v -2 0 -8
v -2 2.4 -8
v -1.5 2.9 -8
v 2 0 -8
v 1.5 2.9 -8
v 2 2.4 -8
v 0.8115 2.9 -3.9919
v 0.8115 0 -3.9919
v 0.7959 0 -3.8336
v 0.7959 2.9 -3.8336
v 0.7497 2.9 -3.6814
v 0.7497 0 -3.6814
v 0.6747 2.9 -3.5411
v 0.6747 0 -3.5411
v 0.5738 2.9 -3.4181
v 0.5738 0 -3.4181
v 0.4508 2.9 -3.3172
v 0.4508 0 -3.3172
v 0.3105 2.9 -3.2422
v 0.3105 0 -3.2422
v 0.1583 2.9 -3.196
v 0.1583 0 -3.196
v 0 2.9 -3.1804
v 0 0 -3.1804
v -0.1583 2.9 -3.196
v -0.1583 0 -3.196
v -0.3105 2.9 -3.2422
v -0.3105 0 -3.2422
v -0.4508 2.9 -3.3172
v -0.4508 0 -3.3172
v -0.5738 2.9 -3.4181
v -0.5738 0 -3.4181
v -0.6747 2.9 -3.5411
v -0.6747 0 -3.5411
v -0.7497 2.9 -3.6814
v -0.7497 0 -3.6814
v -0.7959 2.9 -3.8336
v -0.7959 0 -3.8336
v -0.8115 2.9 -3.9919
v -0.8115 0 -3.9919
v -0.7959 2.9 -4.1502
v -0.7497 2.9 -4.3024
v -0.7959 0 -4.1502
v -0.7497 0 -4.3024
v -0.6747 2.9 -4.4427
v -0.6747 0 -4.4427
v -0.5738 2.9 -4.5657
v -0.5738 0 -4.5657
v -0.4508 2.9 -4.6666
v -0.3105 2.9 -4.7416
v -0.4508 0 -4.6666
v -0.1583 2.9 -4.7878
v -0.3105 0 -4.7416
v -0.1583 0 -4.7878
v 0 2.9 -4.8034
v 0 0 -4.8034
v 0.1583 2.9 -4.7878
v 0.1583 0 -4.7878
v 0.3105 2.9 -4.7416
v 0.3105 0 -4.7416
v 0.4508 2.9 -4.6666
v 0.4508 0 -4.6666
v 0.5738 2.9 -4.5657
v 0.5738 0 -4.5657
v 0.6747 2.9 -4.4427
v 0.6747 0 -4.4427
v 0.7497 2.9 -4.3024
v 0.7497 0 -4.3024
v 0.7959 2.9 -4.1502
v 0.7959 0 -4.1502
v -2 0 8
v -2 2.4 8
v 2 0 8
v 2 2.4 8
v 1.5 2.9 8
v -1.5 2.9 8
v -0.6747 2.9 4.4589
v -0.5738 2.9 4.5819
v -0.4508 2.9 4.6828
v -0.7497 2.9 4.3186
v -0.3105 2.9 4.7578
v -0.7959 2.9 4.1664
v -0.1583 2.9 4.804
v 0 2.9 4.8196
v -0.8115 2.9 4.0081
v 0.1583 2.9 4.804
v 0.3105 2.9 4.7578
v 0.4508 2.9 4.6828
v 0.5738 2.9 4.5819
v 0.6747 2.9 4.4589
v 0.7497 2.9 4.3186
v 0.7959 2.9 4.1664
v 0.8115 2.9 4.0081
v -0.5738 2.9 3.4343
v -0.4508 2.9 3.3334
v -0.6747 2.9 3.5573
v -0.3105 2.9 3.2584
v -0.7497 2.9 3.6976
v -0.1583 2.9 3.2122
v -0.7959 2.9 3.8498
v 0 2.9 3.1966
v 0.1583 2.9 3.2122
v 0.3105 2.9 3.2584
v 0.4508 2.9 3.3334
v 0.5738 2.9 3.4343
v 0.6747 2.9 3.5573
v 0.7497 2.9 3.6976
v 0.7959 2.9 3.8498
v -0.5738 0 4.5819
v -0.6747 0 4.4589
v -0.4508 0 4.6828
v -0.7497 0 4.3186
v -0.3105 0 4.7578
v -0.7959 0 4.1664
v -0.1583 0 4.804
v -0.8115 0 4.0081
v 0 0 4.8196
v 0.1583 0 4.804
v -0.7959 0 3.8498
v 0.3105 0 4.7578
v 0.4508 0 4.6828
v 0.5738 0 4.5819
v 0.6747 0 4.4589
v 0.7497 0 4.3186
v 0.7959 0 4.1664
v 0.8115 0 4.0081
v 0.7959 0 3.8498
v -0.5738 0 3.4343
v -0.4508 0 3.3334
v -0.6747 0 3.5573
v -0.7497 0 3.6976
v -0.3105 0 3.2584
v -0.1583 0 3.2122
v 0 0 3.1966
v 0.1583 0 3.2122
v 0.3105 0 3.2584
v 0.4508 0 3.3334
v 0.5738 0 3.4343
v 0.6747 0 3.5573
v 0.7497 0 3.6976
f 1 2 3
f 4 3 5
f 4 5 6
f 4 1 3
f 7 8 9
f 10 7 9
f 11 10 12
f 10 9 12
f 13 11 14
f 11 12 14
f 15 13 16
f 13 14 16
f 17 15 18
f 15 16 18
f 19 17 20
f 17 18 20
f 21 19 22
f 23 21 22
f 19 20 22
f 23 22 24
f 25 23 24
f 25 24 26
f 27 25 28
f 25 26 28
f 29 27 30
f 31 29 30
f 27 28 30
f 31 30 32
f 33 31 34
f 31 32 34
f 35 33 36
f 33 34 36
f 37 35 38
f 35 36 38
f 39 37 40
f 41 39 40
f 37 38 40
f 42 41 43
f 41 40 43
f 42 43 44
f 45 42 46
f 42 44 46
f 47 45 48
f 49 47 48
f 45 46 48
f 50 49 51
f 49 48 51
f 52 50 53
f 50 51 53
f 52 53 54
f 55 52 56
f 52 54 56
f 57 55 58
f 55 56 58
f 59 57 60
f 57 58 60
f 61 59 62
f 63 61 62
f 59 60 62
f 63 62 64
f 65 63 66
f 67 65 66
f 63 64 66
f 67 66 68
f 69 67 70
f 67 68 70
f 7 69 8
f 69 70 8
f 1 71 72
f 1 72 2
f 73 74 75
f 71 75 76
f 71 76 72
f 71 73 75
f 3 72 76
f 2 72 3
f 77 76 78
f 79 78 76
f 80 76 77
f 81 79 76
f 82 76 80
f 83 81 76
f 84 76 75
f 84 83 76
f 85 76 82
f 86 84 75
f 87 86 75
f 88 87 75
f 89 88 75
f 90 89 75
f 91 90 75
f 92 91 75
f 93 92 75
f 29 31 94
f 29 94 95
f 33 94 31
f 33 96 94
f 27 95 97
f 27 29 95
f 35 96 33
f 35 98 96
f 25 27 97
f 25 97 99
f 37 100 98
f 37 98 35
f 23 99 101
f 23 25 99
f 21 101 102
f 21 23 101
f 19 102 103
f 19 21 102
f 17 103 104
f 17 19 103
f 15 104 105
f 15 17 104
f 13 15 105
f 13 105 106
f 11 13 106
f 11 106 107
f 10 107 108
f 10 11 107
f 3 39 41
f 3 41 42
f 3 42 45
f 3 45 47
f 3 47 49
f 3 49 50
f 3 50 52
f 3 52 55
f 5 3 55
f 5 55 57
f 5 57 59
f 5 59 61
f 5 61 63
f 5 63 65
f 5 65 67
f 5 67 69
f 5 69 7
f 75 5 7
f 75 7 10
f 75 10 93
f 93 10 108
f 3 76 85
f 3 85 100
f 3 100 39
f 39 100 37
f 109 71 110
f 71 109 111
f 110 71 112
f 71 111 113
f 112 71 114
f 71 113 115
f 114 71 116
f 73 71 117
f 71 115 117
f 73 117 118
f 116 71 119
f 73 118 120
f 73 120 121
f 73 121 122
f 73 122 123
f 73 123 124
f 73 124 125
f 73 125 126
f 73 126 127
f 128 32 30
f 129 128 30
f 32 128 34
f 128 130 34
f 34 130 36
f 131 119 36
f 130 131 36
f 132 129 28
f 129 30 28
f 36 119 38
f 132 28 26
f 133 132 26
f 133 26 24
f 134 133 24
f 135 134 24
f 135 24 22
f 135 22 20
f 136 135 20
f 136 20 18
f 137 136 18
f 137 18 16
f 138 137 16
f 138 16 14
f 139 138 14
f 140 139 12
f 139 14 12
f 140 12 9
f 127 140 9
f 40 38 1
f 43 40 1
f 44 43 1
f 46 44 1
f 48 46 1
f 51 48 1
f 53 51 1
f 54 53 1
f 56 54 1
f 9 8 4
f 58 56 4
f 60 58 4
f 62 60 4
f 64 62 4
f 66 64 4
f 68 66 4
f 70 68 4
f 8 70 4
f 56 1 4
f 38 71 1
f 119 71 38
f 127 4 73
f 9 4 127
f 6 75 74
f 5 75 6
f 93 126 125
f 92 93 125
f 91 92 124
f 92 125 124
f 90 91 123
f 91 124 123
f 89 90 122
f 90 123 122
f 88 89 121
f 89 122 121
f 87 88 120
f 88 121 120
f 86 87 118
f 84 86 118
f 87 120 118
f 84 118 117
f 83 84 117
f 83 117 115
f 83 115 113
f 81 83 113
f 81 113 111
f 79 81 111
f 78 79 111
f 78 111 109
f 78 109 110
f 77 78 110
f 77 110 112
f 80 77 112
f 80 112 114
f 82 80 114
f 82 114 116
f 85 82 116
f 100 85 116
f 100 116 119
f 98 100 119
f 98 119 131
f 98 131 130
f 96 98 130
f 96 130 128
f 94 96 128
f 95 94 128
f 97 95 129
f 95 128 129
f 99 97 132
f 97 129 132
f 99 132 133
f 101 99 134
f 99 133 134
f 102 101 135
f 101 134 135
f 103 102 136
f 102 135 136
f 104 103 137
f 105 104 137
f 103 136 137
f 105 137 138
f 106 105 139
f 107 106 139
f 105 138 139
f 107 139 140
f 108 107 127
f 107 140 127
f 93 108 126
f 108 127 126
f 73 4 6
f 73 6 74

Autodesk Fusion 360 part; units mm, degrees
sketch "Sketch1" plane through (0, 0, 0) normal (0, 1, 0) x (1, 0, 0)
  line L0 (2, -8) -> (-2, -8)
  line L1 (-2, -8) -> (-2, 8)
  line L2 (-2, 8) -> (2, 8)
  line L3 (2, 8) -> (2, -8)
  line L4 (0, 3.9919) -> (0, -4.0081) construction
  circle A0 centre (0, 3.9919) radius 1
  circle A1 centre (0, -4.0081) radius 1
  dimension "d1" = 16
  dimension "d2" = 4
  dimension "d3" = 8
  dimension "d4" = 2
  dimension "d5" = 2
extrude "Extrude1" add sketch "Sketch1" along normal blind 2.9
chamfer "Chamfer1" distance 0.5 angle 45 1 edges at (2, 2.9, 0)
chamfer "Chamfer2" distance 0.5 angle 45 1 edges at (-2, 2.9, 0)
thread "Thread1" "ISO Metric profile 2.0 M2x0.4 6H" major diameter 2.074 minor diameter 1.623 pitch 0.4 angle 60 resizes the face on face at (0.9988, 1.9333, 4.058)
thread "Thread2" "ISO Metric profile 2.0 M2x0.4 6H" major diameter 2.074 minor diameter 1.623 pitch 0.4 angle 60 resizes the face on face at (0.9988, 0.9667, -4.0417)
